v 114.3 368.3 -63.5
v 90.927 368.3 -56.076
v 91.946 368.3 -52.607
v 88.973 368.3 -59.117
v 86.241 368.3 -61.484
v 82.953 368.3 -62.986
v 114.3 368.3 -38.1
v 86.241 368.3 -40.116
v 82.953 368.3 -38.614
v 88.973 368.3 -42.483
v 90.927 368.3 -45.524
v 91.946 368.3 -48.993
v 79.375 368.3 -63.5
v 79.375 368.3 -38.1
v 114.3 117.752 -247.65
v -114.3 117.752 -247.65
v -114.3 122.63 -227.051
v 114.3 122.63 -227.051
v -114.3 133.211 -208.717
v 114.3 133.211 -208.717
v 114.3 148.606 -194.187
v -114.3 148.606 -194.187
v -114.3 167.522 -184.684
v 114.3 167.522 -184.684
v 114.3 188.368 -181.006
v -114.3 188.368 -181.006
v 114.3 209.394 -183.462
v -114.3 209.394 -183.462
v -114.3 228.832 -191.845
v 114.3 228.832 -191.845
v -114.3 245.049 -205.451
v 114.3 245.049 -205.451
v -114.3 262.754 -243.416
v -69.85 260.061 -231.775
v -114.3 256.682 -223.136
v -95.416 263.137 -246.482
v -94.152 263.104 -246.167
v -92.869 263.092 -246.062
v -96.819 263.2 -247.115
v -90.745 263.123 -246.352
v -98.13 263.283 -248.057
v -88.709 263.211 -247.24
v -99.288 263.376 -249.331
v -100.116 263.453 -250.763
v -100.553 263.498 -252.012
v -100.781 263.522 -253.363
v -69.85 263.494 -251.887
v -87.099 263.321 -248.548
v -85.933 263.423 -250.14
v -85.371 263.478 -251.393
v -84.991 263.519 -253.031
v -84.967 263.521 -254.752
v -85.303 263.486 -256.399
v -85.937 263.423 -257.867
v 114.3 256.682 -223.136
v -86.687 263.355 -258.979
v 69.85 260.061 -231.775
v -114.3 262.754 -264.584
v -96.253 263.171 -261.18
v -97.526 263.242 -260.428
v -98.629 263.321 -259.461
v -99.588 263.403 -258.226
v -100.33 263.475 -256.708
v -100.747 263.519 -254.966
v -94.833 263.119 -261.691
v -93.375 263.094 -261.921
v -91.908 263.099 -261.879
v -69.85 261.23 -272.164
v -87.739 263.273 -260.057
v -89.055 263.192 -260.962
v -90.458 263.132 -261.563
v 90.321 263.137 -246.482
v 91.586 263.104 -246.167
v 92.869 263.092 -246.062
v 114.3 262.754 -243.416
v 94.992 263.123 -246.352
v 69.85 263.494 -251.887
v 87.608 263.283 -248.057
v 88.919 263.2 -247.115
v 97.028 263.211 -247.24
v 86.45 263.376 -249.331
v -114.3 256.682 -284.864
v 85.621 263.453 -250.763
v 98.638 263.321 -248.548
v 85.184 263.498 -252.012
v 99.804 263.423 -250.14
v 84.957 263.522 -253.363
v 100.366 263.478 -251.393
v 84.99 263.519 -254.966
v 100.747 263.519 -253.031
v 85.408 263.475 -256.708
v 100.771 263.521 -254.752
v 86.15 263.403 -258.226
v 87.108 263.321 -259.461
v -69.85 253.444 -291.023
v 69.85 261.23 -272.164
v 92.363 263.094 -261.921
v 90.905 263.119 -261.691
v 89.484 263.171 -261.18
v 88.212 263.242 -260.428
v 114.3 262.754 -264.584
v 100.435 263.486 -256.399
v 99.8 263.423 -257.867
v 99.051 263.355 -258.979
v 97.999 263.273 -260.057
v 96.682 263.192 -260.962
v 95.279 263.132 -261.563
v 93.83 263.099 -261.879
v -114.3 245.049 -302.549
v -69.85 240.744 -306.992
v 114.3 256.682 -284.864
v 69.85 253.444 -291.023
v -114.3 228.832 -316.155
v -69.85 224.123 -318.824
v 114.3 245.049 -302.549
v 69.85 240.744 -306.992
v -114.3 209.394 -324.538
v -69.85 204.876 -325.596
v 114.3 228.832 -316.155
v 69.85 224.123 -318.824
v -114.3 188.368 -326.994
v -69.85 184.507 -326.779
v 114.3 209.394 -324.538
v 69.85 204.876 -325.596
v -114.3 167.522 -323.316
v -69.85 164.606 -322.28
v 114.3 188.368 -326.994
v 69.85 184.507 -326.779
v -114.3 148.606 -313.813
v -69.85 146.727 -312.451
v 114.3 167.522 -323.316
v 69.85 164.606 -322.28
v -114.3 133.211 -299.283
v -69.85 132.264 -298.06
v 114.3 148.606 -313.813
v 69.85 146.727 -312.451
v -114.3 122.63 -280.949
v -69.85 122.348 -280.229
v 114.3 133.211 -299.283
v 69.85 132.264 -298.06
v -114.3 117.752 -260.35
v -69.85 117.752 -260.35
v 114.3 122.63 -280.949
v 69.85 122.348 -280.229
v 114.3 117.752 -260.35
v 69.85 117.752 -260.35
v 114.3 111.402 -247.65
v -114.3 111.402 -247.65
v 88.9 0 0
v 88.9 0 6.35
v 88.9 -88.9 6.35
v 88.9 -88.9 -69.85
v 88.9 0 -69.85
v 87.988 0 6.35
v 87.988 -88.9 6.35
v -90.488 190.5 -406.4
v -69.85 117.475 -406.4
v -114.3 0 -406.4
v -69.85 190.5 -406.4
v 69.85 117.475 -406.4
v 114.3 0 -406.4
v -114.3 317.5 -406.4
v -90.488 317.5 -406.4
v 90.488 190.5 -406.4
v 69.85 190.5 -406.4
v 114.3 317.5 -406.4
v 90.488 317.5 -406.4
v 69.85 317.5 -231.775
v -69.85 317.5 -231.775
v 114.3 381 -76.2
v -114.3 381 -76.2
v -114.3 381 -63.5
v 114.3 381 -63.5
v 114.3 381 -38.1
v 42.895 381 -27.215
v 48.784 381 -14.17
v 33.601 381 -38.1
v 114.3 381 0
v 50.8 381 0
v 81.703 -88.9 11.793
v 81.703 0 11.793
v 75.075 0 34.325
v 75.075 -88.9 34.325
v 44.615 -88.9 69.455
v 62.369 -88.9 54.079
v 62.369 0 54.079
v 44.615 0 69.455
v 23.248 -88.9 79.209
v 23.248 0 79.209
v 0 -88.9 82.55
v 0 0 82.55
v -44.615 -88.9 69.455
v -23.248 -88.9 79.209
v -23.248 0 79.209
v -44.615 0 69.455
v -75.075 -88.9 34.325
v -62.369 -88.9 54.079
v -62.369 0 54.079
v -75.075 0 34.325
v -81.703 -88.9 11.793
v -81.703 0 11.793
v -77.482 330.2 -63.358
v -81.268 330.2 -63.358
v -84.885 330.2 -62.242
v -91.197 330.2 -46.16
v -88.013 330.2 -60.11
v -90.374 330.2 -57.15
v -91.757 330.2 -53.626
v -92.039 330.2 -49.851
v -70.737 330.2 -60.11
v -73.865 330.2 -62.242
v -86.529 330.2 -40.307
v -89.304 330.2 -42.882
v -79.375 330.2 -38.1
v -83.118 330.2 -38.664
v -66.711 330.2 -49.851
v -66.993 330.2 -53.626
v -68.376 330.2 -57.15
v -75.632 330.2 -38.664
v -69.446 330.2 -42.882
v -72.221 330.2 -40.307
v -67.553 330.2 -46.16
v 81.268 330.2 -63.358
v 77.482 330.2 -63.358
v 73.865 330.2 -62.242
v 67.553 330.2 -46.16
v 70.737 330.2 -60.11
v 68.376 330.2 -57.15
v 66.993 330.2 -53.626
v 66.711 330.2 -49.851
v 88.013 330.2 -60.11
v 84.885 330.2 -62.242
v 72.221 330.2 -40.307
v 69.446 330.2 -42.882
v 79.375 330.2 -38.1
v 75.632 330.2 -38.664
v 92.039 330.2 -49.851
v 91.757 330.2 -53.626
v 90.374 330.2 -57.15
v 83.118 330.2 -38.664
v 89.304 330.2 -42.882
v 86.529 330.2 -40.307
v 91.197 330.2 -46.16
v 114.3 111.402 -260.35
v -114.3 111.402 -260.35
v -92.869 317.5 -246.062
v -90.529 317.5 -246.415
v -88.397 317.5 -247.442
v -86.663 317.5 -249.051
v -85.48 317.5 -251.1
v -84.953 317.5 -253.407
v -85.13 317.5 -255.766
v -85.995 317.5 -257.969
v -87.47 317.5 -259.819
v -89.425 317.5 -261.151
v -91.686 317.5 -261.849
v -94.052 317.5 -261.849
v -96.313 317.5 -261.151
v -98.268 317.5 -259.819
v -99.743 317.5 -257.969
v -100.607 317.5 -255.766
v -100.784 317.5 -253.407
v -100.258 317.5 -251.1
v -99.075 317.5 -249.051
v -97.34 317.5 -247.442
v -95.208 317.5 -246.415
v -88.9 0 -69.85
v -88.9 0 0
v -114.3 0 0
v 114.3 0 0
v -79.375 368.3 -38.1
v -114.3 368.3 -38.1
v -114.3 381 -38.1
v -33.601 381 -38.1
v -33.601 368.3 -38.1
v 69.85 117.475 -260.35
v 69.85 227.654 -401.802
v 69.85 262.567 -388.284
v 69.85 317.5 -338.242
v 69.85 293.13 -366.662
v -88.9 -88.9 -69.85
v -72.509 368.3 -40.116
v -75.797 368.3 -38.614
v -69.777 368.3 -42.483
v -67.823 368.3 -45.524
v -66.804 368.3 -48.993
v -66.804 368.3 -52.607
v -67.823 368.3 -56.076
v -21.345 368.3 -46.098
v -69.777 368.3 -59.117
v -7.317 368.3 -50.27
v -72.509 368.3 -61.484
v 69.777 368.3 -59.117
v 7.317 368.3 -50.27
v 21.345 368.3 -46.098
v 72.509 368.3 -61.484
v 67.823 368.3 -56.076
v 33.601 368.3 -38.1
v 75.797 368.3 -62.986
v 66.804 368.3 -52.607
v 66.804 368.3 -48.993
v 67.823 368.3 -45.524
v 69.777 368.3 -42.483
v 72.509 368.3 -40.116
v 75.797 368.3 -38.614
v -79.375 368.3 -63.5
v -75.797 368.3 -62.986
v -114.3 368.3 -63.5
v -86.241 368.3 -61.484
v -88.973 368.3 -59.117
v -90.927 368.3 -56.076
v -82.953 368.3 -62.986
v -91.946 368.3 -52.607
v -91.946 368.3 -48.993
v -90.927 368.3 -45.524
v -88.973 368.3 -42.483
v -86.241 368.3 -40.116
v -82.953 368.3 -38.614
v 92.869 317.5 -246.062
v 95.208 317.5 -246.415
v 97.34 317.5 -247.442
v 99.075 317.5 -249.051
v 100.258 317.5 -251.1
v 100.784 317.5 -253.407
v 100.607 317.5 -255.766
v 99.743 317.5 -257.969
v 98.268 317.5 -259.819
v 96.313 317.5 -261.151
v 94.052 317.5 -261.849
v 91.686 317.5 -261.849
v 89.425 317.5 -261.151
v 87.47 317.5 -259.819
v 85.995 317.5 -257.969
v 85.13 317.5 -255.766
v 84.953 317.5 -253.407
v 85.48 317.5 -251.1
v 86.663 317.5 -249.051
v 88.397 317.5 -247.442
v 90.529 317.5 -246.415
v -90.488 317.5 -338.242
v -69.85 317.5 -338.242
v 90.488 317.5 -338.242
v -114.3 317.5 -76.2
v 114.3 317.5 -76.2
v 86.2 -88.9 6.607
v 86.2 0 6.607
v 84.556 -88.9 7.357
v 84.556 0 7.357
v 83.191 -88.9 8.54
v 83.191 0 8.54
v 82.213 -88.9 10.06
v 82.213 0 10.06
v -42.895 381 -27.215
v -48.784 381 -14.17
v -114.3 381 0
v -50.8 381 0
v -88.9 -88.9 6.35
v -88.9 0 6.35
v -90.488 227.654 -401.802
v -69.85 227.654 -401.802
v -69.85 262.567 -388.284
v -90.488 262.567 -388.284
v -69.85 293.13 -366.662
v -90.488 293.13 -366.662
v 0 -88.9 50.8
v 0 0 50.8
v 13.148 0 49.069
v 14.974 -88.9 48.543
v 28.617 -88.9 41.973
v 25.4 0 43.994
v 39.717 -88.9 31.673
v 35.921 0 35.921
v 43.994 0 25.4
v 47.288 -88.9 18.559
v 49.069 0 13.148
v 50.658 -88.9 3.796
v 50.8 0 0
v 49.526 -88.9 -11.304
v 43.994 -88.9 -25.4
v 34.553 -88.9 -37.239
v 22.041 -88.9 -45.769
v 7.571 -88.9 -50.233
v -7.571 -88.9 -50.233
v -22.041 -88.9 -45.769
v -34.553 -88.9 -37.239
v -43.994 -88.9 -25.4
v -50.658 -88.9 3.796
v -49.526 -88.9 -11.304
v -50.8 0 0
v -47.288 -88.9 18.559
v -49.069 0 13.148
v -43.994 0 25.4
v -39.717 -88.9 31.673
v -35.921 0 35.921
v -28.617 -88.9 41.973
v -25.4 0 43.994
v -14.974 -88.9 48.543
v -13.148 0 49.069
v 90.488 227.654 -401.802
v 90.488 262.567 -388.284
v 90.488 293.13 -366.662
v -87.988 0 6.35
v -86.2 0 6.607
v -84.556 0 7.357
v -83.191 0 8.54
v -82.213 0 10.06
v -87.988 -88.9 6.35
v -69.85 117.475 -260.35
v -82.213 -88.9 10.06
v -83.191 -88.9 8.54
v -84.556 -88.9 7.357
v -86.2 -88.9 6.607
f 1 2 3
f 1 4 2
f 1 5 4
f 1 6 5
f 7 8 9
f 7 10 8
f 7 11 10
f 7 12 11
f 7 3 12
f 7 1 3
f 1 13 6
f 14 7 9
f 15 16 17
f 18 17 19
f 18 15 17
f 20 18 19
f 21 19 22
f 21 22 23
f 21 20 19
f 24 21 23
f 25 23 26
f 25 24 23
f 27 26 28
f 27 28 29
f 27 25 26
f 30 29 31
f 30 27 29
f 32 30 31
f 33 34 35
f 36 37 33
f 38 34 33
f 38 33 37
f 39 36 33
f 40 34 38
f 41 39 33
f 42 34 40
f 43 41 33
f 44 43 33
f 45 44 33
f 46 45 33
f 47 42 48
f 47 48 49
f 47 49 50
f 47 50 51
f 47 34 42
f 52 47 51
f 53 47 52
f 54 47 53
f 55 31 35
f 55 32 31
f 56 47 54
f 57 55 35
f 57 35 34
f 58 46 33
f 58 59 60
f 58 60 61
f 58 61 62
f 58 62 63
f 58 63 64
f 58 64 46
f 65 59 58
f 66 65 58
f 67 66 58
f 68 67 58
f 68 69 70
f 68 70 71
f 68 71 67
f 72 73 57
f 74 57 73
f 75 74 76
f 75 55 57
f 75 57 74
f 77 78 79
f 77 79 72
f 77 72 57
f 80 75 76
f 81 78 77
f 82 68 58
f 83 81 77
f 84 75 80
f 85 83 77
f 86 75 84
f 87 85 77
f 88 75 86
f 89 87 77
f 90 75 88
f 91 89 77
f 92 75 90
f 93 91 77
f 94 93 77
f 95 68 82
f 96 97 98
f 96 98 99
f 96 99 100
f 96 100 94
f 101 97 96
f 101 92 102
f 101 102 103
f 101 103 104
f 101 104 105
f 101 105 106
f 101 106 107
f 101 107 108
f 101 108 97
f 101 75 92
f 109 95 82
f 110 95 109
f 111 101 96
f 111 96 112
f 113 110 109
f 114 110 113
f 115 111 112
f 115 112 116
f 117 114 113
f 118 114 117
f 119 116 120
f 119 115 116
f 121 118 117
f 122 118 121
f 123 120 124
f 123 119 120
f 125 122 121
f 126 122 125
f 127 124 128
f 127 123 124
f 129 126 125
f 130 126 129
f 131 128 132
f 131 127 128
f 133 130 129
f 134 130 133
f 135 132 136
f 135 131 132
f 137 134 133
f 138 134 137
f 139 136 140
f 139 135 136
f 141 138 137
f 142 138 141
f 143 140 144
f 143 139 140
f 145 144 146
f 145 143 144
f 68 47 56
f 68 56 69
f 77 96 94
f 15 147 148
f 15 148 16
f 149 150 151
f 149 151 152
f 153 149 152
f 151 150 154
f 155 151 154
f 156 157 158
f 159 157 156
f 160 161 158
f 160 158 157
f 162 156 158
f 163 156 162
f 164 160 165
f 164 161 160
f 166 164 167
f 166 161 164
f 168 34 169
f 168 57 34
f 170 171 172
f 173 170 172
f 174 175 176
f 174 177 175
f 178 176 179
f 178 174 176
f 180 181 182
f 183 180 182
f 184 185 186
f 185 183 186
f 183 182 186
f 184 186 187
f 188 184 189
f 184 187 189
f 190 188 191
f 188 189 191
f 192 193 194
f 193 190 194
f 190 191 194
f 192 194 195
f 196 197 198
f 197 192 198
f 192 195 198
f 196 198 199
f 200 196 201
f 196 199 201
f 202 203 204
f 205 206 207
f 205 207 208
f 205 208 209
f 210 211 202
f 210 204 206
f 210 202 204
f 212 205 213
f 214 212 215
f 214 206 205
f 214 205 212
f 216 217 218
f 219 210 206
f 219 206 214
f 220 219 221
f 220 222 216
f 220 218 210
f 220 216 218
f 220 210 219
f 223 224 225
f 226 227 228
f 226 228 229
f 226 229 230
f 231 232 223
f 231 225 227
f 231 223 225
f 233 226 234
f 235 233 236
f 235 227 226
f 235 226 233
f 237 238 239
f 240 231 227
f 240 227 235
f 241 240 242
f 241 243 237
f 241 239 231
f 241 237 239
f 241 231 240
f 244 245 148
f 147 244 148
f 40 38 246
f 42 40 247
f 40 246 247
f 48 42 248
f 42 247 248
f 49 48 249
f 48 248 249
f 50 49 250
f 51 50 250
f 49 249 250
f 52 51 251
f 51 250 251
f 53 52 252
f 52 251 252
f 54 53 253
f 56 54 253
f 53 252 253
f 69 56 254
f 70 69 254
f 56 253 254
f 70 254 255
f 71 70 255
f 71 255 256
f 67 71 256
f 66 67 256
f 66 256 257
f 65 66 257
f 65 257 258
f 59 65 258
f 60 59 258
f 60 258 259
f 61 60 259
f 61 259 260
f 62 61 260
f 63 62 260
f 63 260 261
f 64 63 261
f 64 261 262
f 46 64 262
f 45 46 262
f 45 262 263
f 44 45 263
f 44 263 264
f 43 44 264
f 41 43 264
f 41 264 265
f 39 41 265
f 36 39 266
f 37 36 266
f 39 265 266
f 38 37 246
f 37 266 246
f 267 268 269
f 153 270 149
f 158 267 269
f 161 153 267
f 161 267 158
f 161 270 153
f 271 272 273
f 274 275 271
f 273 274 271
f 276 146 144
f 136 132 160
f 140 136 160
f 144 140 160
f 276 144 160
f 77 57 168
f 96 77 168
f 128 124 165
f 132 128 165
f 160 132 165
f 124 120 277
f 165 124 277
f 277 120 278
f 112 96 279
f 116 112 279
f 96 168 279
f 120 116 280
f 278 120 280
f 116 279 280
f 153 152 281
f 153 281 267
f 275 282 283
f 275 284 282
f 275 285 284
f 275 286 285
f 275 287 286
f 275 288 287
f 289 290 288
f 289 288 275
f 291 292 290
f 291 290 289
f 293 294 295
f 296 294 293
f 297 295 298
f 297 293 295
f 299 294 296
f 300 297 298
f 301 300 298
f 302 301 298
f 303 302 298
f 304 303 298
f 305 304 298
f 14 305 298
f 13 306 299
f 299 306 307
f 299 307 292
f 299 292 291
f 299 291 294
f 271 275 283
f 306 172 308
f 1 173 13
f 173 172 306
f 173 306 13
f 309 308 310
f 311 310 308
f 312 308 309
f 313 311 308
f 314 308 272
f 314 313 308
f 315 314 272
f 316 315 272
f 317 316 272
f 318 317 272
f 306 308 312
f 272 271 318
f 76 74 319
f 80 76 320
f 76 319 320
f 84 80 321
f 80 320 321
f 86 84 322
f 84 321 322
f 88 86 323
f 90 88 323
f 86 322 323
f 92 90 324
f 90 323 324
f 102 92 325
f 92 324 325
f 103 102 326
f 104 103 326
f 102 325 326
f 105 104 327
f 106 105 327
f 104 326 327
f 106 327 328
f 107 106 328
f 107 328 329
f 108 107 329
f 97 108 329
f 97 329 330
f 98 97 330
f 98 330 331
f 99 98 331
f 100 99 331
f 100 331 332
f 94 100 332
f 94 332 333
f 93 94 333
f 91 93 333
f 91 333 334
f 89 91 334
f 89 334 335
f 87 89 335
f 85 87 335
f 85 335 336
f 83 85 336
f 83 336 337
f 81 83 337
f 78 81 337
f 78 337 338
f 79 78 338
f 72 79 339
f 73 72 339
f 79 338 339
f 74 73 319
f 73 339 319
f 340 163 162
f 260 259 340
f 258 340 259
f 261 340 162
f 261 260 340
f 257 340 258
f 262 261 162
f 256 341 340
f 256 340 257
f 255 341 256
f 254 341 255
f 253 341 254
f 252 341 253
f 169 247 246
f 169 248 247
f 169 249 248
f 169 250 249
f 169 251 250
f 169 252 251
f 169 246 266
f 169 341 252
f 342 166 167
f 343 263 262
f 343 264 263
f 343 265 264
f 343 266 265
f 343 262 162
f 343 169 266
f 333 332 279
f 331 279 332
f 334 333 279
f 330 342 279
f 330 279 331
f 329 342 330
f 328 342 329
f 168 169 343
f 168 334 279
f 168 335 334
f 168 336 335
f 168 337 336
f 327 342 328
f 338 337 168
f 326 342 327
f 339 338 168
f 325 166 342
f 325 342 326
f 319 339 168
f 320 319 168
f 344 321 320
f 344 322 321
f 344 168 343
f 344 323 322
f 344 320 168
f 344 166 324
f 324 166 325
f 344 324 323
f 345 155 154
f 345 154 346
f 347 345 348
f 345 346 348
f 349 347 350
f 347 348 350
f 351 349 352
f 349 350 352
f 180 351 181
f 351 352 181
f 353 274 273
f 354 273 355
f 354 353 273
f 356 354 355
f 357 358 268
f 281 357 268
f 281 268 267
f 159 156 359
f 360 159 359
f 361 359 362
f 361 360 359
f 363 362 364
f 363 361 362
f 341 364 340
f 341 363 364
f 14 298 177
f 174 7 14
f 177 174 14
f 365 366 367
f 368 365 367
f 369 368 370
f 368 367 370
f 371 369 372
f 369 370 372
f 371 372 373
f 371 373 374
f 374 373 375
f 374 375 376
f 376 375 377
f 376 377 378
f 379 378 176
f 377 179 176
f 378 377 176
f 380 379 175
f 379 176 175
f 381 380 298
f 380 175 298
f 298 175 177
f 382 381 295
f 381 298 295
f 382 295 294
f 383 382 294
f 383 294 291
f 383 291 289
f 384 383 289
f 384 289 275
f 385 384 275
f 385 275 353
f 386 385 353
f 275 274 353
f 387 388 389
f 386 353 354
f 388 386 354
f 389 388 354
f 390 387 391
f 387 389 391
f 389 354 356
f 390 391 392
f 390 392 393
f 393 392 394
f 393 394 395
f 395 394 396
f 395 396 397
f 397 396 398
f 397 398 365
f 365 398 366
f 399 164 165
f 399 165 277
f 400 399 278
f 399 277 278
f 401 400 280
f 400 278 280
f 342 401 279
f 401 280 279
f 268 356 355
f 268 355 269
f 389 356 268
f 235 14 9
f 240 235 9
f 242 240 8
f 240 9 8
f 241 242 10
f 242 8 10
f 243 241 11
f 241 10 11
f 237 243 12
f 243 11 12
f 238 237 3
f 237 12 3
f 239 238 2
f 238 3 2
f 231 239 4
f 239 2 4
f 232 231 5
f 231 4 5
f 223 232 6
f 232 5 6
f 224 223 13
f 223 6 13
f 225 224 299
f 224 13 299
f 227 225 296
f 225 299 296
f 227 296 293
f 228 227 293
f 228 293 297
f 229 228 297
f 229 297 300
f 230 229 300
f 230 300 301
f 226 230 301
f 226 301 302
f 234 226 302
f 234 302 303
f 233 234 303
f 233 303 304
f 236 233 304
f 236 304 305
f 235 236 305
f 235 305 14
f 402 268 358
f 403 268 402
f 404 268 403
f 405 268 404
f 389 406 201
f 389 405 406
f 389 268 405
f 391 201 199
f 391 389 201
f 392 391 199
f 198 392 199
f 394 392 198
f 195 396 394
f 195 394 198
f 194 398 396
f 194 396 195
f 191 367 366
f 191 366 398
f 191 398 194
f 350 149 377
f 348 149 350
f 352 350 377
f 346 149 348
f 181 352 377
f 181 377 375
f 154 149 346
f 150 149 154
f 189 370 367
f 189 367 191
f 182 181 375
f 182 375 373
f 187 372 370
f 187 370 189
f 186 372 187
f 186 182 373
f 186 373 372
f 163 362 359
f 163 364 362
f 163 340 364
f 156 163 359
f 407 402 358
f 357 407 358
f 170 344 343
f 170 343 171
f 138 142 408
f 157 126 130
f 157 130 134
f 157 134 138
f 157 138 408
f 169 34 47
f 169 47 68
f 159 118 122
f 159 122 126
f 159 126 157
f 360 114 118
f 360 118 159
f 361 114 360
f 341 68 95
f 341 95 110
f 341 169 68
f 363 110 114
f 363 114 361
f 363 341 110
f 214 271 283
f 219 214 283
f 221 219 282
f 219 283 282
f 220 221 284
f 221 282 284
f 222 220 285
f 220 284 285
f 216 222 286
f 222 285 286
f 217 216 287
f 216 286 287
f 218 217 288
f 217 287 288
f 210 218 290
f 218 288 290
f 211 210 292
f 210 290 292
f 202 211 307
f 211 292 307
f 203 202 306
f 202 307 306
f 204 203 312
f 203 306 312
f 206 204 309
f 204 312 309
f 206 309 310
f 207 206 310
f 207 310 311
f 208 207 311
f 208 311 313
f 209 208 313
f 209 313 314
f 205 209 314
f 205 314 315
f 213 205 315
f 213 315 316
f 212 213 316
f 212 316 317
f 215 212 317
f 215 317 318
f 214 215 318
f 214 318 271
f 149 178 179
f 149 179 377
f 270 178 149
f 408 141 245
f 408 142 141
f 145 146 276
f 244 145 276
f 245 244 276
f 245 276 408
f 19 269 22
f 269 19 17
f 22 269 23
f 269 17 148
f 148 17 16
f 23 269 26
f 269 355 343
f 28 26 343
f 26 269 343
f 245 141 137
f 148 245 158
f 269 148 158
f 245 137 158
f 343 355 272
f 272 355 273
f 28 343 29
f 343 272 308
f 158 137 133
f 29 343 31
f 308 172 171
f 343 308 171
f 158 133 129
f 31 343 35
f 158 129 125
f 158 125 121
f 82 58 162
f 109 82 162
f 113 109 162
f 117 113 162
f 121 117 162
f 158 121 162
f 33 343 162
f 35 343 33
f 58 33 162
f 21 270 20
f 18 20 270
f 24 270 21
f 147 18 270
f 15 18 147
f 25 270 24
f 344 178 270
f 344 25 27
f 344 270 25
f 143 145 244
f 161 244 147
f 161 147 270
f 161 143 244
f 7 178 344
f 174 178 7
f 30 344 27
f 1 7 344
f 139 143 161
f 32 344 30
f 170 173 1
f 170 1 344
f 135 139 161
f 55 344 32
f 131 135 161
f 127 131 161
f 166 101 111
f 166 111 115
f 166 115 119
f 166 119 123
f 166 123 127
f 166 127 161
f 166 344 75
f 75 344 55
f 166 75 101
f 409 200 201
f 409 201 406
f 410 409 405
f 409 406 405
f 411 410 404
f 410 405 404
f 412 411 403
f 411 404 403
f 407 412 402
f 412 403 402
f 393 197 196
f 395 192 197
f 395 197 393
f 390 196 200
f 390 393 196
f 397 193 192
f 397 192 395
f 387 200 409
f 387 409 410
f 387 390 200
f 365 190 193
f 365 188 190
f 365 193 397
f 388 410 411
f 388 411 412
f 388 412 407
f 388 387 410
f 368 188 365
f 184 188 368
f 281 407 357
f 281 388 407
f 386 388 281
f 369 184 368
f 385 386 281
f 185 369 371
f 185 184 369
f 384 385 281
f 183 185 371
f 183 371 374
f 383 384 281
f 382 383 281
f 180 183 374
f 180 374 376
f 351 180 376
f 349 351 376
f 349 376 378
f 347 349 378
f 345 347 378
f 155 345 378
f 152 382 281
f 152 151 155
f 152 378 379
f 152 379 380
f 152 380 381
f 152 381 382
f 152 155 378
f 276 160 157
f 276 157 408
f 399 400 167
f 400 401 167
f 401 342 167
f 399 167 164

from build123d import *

# Parameters (mm, degrees)
BOSS_EXTRUDE2_DEPTH     = 69.85
BOSS_EXTRUDE3_START     = 69.85
BOSS_EXTRUDE3_DEPTH     = 20.6375
BOSS_EXTRUDE4_START     = 90.4875
BOSS_EXTRUDE4_DEPTH     = 23.8125
BOSS_EXTRUDE5_START     = 69.85
BOSS_EXTRUDE5_DEPTH     = 19.05
SKETCH2_R               = 50.8
CUT_EXTRUDE1_DEPTH      = 632.689369865
SKETCH3_R               = 12.7
CUT_EXTRUDE2_DEPTH      = 38.1
CUT_EXTRUDE3_REACH      = 587.992
CUT_EXTRUDE3_END_RADIUS = 73.025
SKETCH4_R               = 7.9375


# Read off the part's stored shape, not the designer's step: Boss-Extrude4
with BuildPart() as part:
    # Sketch1 → Boss-Extrude2 (new body)
    with BuildSketch(Plane(origin=(0, 0, 0), x_dir=(0, 0, -1), z_dir=(1, 0, 0))):
        with BuildLine():
            Line((0, 381), (0, 0))
            Line((0, 0), (-82.55, 0))
            Line((-82.55, 0), (-82.55, -88.9))
            Line((-82.55, -88.9), (69.85, -88.9))
            Line((69.85, -88.9), (69.85, 0))
            Line((69.85, 0), (406.4, 0))
            Line((406.4, 0), (406.4, 117.475))
            Line((406.4, 117.475), (260.35, 117.475))
            Line((260.35, 117.475), (260.35, 111.401610843))
            Line((260.35, 111.401610843), (247.65, 111.401610843))
            Line((247.65, 111.401610843), (247.65, 117.751610843))
            ThreePointArc((247.65, 117.751610843), (181.425166335, 182.404066236), (231.775, 260.060764803))
            Line((231.775, 260.060764803), (231.775, 317.5))
            Line((231.775, 317.5), (76.2, 317.5))
            Line((76.2, 317.5), (76.2, 381))
            Line((76.2, 381), (63.5, 381))
            Line((63.5, 381), (63.5, 368.3))
            Line((63.5, 368.3), (38.1, 368.3))
            Line((38.1, 368.3), (38.1, 381))
            Line((38.1, 381), (0, 381))
        make_face()
    boss_extrude2 = extrude(amount=BOSS_EXTRUDE2_DEPTH)

    # Sketch1<4> → Boss-Extrude3 (add)
    with BuildSketch(Plane(origin=(0, 0, 0), x_dir=(0, 0, -1), z_dir=(1, 0, 0)).offset(BOSS_EXTRUDE3_START)):
        with BuildLine():
            Line((0, 381), (0, 0))
            Line((0, 0), (406.4, 0))
            Line((406.4, 0), (406.4, 190.5))
            ThreePointArc((406.4, 190.5), (388.283807472, 262.566768006), (338.242269675, 317.5))
            Line((338.242269675, 317.5), (76.2, 317.5))
            Line((76.2, 317.5), (76.2, 381))
            Line((76.2, 381), (63.5, 381))
            Line((63.5, 381), (63.5, 368.3))
            Line((63.5, 368.3), (38.1, 368.3))
            Line((38.1, 368.3), (38.1, 381))
            Line((38.1, 381), (0, 381))
        make_face()
        with BuildLine():
            Line((260.35, 117.751610843), (260.35, 111.401610843))
            Line((260.35, 111.401610843), (247.65, 111.401610843))
            Line((247.65, 111.401610843), (247.65, 117.751610843))
            ThreePointArc((247.65, 117.751610843), (254, 263.525), (260.35, 117.751610843))
        make_face(mode=Mode.SUBTRACT)
    boss_extrude3 = extrude(amount=BOSS_EXTRUDE3_DEPTH)

    # Boss-Extrude4 outline → Boss-Extrude4 (add)
    with BuildSketch(Plane(origin=(0, 0, 0), x_dir=(0, 0, -1), z_dir=(1, 0, 0)).offset(BOSS_EXTRUDE4_START)):
        Polygon((406.4, 317.5), (76.2, 317.5), (76.2, 381), (63.5, 381), (63.5, 368.3), (38.1, 368.3), (38.1, 381), (0, 381), (0, 0), (406.4, 0), align=None)
        with BuildLine():
            Line((247.65, 111.401610843), (247.65, 117.751610843))
            ThreePointArc((247.65, 117.751610843), (254, 263.525), (260.35, 117.751610843))
            Line((260.35, 117.751610843), (260.35, 111.401610843))
            Line((260.35, 111.401610843), (247.65, 111.401610843))
        make_face(mode=Mode.SUBTRACT)
    boss_extrude4 = extrude(amount=BOSS_EXTRUDE4_DEPTH)

    # Sketch1<6> → Boss-Extrude5 (add)
    with BuildSketch(Plane(origin=(0, 0, 0), x_dir=(0, 0, -1), z_dir=(1, 0, 0)).offset(BOSS_EXTRUDE5_START)):
        Polygon((69.85, 0), (0, 0), (-82.55, 0), (-82.55, -88.9), (69.85, -88.9), align=None)
    boss_extrude5 = extrude(amount=BOSS_EXTRUDE5_DEPTH)

    # Mirror2: Boss-Extrude2, Boss-Extrude3, Boss-Extrude4, Boss-Extrude5 across plane
    add(boss_extrude2.mirror(Plane(origin=(0, 0, 0), x_dir=(0, 0, 1), z_dir=(1, 0, 0))))
    add(boss_extrude3.mirror(Plane(origin=(0, 0, 0), x_dir=(0, 0, 1), z_dir=(1, 0, 0))))
    add(boss_extrude4.mirror(Plane(origin=(0, 0, 0), x_dir=(0, 0, 1), z_dir=(1, 0, 0))))
    add(boss_extrude5.mirror(Plane(origin=(0, 0, 0), x_dir=(0, 0, 1), z_dir=(1, 0, 0))))

    # Sketch2 → Cut-Extrude1 (cut, through all)
    with BuildSketch(Plane(origin=(0, 381, 0), x_dir=(1, 0, 0), z_dir=(0, 1, 0))):
        with Locations(Location((0, 0, 0), (0, 0, 270))):
            Circle(SKETCH2_R)
        with BuildLine():
            Line((-88.9, -88.9), (88.9, -88.9))
            Line((88.9, -88.9), (88.9, -6.35))
            Line((88.9, -6.35), (87.988181024, -6.35))
            ThreePointArc((87.988181024, -6.35), (83.831130216, -7.899851193), (81.703310951, -11.792857143))
            ThreePointArc((81.703310951, -11.792857143), (0, -82.55), (-81.703310951, -11.792857143))
            ThreePointArc((-81.703310951, -11.792857143), (-83.831130216, -7.899851193), (-87.988181024, -6.35))
            Line((-87.988181024, -6.35), (-88.9, -6.35))
            Line((-88.9, -6.35), (-88.9, -88.9))
        make_face()
    extrude(amount=-CUT_EXTRUDE1_DEPTH, mode=Mode.SUBTRACT)

    # Sketch3 → Cut-Extrude2 (cut)
    with BuildSketch(Plane(origin=(0, 368.3, 0), x_dir=(1, 0, 0), z_dir=(0, 1, 0))):
        with Locations(Location((-79.375, 50.8, 0), (0, 0, 270))):
            Circle(SKETCH3_R)
        with Locations(Location((79.375, 50.8, 0), (0, 0, 270))):
            Circle(SKETCH3_R)
    extrude(amount=-CUT_EXTRUDE2_DEPTH, mode=Mode.SUBTRACT)

    # Cut-Extrude3: up to this cylinder (the profile starts outside it)
    cut_extrude3_end = Plane(origin=(0, 190.5, -254), z_dir=(-1, 0, 0)) * Cylinder(CUT_EXTRUDE3_END_RADIUS, 1508.7715, mode=Mode.PRIVATE)
    # Sketch4 → Cut-Extrude3 (cut, up to the surface)
    with BuildSketch(Plane(origin=(0, 317.5, 0), x_dir=(1, 0, 0), z_dir=(0, 1, 0)), mode=Mode.PRIVATE) as cut_extrude3_sk1:
        with Locations(Location((-92.86875, 254, 0), (0, 0, 270))):
            Circle(SKETCH4_R)
    cut_extrude3_tool1 = extrude(cut_extrude3_sk1.sketch, amount=-CUT_EXTRUDE3_REACH, mode=Mode.PRIVATE) - cut_extrude3_end
    add(cut_extrude3_tool1.solids().sort_by_distance((-92.86875, 317.5, -254))[0], mode=Mode.SUBTRACT)
    # Sketch4 → Cut-Extrude3 (cut, up to the surface)
    with BuildSketch(Plane(origin=(0, 317.5, 0), x_dir=(1, 0, 0), z_dir=(0, 1, 0)), mode=Mode.PRIVATE) as cut_extrude3_sk2:
        with Locations(Location((92.86875, 254, 0), (0, 0, 270))):
            Circle(SKETCH4_R)
    cut_extrude3_tool2 = extrude(cut_extrude3_sk2.sketch, amount=-CUT_EXTRUDE3_REACH, mode=Mode.PRIVATE) - cut_extrude3_end
    add(cut_extrude3_tool2.solids().sort_by_distance((92.86875, 317.5, -254))[0], mode=Mode.SUBTRACT)


solid = part.part
